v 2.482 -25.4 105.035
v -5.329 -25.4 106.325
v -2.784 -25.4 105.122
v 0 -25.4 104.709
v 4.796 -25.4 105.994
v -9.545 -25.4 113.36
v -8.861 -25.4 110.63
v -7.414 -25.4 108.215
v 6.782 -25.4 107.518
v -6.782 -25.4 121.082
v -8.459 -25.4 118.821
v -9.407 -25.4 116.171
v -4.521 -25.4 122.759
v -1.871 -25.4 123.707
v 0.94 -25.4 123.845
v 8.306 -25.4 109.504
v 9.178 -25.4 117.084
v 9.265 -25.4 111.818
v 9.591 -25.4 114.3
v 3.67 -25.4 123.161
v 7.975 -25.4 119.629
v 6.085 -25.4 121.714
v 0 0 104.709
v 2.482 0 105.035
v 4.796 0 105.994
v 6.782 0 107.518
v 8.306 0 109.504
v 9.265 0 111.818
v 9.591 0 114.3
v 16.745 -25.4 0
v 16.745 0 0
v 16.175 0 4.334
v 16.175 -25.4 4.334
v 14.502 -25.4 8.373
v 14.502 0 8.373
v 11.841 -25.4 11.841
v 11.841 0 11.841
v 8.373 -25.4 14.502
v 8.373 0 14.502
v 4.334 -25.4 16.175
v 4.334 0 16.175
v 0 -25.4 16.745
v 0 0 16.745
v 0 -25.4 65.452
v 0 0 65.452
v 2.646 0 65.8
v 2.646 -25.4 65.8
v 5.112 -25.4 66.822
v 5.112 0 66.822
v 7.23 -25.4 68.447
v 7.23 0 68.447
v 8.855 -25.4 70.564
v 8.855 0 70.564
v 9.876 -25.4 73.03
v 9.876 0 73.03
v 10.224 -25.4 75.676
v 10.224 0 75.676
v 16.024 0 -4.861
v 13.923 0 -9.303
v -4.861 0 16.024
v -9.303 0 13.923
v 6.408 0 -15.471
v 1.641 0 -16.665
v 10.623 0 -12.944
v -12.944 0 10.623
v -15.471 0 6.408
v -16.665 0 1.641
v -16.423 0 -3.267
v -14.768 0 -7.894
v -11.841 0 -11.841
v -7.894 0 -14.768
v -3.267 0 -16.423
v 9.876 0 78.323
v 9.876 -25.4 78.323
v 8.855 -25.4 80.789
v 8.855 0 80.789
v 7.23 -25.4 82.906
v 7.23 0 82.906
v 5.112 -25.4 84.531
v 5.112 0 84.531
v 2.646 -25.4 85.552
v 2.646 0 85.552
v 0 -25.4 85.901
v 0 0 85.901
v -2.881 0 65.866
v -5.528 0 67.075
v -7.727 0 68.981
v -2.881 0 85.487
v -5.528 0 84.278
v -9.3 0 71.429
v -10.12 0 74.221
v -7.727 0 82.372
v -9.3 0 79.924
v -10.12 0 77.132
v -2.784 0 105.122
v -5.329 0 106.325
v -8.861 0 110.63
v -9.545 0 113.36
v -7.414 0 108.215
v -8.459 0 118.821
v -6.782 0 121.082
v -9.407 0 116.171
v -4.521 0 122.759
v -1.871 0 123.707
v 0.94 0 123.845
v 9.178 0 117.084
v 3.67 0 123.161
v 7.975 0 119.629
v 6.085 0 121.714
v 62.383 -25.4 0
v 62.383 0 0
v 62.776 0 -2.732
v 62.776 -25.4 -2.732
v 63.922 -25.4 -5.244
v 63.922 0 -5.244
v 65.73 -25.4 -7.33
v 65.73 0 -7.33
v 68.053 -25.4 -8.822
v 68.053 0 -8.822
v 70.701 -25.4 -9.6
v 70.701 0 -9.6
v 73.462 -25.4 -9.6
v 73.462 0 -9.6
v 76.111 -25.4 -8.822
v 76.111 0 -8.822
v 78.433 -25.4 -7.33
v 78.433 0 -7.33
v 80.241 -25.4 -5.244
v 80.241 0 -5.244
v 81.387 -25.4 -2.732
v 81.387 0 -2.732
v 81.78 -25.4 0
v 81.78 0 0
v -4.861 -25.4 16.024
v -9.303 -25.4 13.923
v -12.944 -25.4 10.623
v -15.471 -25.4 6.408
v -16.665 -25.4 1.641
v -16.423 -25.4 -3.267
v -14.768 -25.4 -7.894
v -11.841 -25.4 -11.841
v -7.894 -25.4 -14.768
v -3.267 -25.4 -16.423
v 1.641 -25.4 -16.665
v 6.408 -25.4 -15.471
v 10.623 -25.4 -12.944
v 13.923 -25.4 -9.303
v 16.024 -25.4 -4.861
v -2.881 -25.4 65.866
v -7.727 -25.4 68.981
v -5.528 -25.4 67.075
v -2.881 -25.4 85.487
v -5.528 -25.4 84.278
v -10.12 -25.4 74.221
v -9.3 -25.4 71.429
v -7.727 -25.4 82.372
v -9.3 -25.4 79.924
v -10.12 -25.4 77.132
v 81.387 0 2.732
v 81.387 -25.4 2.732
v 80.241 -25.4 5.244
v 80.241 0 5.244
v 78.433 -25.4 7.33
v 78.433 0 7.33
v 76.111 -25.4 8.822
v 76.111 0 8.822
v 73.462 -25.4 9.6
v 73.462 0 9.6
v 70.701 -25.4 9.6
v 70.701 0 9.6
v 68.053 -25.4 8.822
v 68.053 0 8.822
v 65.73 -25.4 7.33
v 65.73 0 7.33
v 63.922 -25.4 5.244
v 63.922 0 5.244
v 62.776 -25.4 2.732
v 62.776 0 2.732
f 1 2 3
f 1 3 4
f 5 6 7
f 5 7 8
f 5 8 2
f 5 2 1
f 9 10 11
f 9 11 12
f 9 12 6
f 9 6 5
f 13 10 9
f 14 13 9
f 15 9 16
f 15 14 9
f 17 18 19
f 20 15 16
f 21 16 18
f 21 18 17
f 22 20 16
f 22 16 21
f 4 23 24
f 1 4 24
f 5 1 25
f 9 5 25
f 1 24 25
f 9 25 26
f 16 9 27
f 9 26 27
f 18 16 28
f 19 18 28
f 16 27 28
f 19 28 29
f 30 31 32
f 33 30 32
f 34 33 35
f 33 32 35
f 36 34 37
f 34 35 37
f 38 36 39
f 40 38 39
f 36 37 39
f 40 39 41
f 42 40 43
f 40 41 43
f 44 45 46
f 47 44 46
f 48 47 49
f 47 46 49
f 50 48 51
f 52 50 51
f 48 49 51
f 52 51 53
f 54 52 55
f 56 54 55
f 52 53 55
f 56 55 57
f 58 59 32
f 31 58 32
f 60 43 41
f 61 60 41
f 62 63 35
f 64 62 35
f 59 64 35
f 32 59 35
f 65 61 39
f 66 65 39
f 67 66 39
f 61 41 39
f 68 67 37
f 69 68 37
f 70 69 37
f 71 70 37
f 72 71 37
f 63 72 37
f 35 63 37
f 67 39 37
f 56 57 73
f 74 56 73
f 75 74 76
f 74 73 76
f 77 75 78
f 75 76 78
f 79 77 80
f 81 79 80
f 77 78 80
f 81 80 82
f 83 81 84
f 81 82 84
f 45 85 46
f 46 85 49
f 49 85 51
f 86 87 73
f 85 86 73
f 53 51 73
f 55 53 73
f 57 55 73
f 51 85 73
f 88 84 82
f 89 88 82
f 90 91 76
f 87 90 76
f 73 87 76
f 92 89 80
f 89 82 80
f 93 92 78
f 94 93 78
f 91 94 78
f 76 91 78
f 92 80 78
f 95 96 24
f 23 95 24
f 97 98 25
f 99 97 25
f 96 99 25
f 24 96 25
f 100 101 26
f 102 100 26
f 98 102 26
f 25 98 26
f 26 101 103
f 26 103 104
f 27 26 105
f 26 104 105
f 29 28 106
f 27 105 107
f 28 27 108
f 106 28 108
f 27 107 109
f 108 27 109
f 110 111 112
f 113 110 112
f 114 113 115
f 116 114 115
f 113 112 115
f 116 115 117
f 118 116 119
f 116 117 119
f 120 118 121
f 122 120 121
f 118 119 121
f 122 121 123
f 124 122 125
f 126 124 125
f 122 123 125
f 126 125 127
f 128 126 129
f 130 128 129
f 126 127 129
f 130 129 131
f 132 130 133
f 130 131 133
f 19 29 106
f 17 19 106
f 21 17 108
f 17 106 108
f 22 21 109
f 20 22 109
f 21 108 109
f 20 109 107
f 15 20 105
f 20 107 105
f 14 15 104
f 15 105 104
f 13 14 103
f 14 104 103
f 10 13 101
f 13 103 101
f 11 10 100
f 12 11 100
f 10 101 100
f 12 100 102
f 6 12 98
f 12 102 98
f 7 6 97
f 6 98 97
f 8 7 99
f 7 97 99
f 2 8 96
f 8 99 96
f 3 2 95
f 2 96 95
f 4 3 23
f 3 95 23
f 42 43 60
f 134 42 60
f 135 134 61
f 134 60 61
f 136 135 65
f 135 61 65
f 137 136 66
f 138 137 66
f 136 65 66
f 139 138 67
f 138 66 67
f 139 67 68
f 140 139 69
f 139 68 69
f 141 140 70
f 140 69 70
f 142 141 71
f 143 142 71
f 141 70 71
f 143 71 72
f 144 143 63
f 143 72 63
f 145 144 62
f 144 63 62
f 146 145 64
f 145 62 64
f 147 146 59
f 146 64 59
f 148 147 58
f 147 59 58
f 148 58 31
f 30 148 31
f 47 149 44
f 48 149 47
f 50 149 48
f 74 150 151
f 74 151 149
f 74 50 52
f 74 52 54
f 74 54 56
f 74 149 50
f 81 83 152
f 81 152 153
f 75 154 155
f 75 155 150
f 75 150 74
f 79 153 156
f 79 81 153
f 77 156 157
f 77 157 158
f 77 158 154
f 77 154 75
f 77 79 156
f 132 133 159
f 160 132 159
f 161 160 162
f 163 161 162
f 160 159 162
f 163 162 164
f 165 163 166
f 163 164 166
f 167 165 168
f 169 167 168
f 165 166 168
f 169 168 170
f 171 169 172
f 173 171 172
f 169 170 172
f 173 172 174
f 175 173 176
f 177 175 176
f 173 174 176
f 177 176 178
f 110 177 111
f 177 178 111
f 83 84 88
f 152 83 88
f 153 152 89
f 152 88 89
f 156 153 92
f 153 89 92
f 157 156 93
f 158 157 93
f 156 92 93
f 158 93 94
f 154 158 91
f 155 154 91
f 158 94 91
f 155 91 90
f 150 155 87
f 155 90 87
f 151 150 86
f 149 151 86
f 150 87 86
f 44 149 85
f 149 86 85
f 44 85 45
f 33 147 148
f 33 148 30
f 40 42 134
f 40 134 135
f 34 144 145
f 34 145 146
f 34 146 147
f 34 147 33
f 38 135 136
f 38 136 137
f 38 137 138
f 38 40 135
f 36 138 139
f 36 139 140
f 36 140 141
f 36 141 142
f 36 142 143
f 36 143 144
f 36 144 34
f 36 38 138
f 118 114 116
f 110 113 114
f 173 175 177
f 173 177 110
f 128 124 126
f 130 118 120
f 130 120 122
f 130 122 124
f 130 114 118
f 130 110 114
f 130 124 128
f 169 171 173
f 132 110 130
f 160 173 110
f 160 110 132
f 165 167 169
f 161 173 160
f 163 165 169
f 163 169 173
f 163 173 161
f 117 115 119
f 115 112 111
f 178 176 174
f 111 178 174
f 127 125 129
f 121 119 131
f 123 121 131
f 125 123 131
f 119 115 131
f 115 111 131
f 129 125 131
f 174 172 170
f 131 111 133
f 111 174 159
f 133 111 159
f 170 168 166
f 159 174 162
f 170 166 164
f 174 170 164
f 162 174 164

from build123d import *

# Parameters (mm, degrees)
F1_DEPTH = 25.4


with BuildPart() as f1:
    # F0 (on Front) → F1 (new body)
    with BuildSketch(Plane.XZ):
        with BuildLine():
            Line((16.745215, 0), (0, 0))
            Line((0, 0), (0, 16.745215))
            ThreePointArc((0, 16.745215), (-11.840655, -11.840655), (16.745215, 0))
        make_face()
        with BuildLine():
            Line((0, 16.745215), (0, 0))
            Line((0, 0), (16.745215, 0))
            ThreePointArc((16.745215, 0), (11.840655, 11.840655), (0, 16.745215))
        make_face()
        with BuildLine():
            ThreePointArc((9.591345, 114.3), (-6.782105, 121.082105), (0, 104.708655))
            ThreePointArc((0, 104.708655), (6.782105, 107.517895), (9.591345, 114.3))
        make_face()
        with BuildLine():
            ThreePointArc((0, 85.90078), (-10.224344, 75.676435), (0, 65.452091))
            Line((0, 65.452091), (0, 85.90078))
        make_face()
        with BuildLine():
            Line((0, 85.90078), (0, 65.452091))
            ThreePointArc((0, 65.452091), (7.229703, 68.446732), (10.224344, 75.676435))
            ThreePointArc((10.224344, 75.676435), (7.229703, 82.906138), (0, 85.90078))
        make_face()
        with BuildLine():
            ThreePointArc((81.780338, 0), (72.081553, 9.698785), (62.382769, 0))
            ThreePointArc((62.382769, 0), (72.081553, -9.698785), (81.780338, 0))
        make_face()
    extrude(amount=F1_DEPTH)


solid = f1.part
